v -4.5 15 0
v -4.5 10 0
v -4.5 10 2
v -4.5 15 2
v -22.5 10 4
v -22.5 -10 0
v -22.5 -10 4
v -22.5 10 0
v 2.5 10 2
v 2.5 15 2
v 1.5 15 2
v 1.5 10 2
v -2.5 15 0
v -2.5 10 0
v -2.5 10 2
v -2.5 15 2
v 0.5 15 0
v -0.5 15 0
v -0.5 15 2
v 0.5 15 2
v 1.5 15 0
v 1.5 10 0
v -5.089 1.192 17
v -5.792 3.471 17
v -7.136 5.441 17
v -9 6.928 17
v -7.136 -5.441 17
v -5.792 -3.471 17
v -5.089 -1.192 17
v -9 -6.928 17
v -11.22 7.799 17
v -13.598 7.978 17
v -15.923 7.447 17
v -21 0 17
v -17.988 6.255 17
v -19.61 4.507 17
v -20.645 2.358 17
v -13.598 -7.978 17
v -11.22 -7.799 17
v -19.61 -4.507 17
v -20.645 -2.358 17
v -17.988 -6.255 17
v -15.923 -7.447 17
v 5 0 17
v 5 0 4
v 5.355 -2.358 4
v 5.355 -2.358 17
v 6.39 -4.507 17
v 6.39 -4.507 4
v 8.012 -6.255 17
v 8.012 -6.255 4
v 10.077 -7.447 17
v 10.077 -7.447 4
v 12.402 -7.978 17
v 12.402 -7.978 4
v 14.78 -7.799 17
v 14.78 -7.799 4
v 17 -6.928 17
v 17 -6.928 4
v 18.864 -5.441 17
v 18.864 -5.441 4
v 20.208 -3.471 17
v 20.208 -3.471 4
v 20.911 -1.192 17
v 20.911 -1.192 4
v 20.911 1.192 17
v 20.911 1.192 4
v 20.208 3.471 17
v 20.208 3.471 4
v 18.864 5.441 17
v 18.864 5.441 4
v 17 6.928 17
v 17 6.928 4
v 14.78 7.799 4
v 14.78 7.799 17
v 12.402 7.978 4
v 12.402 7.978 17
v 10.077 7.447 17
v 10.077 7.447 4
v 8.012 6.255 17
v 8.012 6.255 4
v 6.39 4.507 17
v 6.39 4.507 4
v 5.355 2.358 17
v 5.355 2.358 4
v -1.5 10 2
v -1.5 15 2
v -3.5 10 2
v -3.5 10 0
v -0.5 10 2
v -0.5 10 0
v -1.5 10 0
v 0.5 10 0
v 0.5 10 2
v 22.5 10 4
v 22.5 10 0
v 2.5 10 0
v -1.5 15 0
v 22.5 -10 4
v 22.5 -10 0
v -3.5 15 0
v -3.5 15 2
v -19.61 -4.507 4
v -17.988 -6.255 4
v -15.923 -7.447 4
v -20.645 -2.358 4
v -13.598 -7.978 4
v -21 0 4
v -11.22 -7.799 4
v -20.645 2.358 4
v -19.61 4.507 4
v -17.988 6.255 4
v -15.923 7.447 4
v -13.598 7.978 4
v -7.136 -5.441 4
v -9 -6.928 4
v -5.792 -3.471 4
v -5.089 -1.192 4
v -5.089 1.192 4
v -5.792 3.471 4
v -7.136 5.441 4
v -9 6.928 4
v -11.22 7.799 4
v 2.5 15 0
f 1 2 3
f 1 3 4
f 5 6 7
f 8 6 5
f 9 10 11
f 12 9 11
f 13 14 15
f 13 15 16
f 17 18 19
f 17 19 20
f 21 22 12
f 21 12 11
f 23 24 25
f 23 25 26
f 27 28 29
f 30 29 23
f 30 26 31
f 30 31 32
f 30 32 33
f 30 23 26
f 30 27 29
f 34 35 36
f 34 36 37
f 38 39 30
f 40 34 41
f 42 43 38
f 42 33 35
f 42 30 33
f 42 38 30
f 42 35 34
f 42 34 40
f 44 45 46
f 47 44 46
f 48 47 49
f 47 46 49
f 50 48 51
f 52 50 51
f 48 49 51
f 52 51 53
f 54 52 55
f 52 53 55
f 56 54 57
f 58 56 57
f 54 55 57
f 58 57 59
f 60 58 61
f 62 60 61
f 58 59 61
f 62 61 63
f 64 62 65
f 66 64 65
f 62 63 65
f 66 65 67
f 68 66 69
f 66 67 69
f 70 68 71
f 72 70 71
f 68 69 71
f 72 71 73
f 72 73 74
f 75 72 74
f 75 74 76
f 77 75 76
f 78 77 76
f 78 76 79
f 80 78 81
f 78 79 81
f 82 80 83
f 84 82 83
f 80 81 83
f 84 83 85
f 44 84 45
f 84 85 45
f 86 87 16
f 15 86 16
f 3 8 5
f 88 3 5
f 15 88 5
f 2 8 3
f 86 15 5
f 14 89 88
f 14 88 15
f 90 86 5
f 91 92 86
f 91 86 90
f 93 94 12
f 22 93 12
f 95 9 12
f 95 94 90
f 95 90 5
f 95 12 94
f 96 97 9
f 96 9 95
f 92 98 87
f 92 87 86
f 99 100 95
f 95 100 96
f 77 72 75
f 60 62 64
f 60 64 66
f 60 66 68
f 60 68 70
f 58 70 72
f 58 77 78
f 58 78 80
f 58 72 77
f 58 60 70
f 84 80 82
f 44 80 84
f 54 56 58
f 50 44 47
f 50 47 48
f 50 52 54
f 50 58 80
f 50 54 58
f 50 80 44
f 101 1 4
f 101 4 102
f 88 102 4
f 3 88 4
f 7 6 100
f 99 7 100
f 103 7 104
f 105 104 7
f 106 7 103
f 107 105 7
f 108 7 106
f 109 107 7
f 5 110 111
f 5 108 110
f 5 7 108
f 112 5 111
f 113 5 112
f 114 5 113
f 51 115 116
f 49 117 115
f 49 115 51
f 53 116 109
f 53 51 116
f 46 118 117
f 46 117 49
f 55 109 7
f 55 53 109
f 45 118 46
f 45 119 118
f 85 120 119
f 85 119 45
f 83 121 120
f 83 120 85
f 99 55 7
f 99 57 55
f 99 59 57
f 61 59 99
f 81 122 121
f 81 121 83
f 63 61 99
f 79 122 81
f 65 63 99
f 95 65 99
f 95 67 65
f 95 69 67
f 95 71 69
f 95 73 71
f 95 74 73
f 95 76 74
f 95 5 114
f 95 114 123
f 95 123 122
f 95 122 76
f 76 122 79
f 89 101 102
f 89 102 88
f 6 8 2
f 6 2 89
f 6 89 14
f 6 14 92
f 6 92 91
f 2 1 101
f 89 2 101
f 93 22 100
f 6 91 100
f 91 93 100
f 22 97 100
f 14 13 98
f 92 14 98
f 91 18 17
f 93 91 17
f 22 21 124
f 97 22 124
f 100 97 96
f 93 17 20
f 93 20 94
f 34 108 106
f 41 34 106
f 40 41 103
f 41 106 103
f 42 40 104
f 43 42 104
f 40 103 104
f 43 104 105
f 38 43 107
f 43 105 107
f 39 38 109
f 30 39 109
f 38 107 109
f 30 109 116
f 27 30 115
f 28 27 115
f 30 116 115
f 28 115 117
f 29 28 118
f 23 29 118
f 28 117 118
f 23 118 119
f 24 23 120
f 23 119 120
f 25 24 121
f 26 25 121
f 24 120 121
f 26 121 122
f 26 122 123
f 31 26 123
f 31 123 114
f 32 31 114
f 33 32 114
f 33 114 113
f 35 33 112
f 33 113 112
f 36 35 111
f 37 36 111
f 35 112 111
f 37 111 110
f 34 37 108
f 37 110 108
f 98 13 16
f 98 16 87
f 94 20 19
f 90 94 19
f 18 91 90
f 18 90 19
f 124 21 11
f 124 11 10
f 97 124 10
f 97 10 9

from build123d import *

# Parameters (mm, degrees)
SKETCH1_W           = 45
SKETCH1_H           = 20
BOSS_EXTRUDE1_DEPTH = 4
SKETCH2_R           = 8
BOSS_EXTRUDE2_DEPTH = 13
BOSS_EXTRUDE3_DEPTH = 2


with BuildPart() as part:
    # Sketch1 → Boss-Extrude1 (new body)
    with BuildSketch(Plane.XY):
        Rectangle(SKETCH1_W, SKETCH1_H)
    extrude(amount=BOSS_EXTRUDE1_DEPTH)

    # Sketch2 → Boss-Extrude2 (add)
    with BuildSketch(Plane.XY.offset(4)):
        with Locations(Location((-13, 0, 0), (0, 0, 180))):
            Circle(SKETCH2_R)
        with Locations(Location((13, 0, 0), (0, 0, 180))):
            Circle(SKETCH2_R)
    extrude(amount=BOSS_EXTRUDE2_DEPTH)

    # Sketch4 → Boss-Extrude3 (add)
    with BuildSketch(Plane(origin=(0, 0, 0), x_dir=(-1, 0, 0), z_dir=(0, 0, -1))):
        Polygon((2, 15), (1.5, 15), (1.5, 10), (2.5, 10), (2.5, 15), align=None)
        Polygon((0, 15), (-0.5, 15), (-0.5, 10), (0.5, 10), (0.5, 15), align=None)
        Polygon((4, 15), (3.5, 15), (3.5, 10), (4.5, 10), (4.5, 15), align=None)
        Polygon((-2, 15), (-2.5, 15), (-2.5, 10), (-1.5, 10), (-1.5, 15), align=None)
    extrude(amount=-BOSS_EXTRUDE3_DEPTH)


solid = part.part
